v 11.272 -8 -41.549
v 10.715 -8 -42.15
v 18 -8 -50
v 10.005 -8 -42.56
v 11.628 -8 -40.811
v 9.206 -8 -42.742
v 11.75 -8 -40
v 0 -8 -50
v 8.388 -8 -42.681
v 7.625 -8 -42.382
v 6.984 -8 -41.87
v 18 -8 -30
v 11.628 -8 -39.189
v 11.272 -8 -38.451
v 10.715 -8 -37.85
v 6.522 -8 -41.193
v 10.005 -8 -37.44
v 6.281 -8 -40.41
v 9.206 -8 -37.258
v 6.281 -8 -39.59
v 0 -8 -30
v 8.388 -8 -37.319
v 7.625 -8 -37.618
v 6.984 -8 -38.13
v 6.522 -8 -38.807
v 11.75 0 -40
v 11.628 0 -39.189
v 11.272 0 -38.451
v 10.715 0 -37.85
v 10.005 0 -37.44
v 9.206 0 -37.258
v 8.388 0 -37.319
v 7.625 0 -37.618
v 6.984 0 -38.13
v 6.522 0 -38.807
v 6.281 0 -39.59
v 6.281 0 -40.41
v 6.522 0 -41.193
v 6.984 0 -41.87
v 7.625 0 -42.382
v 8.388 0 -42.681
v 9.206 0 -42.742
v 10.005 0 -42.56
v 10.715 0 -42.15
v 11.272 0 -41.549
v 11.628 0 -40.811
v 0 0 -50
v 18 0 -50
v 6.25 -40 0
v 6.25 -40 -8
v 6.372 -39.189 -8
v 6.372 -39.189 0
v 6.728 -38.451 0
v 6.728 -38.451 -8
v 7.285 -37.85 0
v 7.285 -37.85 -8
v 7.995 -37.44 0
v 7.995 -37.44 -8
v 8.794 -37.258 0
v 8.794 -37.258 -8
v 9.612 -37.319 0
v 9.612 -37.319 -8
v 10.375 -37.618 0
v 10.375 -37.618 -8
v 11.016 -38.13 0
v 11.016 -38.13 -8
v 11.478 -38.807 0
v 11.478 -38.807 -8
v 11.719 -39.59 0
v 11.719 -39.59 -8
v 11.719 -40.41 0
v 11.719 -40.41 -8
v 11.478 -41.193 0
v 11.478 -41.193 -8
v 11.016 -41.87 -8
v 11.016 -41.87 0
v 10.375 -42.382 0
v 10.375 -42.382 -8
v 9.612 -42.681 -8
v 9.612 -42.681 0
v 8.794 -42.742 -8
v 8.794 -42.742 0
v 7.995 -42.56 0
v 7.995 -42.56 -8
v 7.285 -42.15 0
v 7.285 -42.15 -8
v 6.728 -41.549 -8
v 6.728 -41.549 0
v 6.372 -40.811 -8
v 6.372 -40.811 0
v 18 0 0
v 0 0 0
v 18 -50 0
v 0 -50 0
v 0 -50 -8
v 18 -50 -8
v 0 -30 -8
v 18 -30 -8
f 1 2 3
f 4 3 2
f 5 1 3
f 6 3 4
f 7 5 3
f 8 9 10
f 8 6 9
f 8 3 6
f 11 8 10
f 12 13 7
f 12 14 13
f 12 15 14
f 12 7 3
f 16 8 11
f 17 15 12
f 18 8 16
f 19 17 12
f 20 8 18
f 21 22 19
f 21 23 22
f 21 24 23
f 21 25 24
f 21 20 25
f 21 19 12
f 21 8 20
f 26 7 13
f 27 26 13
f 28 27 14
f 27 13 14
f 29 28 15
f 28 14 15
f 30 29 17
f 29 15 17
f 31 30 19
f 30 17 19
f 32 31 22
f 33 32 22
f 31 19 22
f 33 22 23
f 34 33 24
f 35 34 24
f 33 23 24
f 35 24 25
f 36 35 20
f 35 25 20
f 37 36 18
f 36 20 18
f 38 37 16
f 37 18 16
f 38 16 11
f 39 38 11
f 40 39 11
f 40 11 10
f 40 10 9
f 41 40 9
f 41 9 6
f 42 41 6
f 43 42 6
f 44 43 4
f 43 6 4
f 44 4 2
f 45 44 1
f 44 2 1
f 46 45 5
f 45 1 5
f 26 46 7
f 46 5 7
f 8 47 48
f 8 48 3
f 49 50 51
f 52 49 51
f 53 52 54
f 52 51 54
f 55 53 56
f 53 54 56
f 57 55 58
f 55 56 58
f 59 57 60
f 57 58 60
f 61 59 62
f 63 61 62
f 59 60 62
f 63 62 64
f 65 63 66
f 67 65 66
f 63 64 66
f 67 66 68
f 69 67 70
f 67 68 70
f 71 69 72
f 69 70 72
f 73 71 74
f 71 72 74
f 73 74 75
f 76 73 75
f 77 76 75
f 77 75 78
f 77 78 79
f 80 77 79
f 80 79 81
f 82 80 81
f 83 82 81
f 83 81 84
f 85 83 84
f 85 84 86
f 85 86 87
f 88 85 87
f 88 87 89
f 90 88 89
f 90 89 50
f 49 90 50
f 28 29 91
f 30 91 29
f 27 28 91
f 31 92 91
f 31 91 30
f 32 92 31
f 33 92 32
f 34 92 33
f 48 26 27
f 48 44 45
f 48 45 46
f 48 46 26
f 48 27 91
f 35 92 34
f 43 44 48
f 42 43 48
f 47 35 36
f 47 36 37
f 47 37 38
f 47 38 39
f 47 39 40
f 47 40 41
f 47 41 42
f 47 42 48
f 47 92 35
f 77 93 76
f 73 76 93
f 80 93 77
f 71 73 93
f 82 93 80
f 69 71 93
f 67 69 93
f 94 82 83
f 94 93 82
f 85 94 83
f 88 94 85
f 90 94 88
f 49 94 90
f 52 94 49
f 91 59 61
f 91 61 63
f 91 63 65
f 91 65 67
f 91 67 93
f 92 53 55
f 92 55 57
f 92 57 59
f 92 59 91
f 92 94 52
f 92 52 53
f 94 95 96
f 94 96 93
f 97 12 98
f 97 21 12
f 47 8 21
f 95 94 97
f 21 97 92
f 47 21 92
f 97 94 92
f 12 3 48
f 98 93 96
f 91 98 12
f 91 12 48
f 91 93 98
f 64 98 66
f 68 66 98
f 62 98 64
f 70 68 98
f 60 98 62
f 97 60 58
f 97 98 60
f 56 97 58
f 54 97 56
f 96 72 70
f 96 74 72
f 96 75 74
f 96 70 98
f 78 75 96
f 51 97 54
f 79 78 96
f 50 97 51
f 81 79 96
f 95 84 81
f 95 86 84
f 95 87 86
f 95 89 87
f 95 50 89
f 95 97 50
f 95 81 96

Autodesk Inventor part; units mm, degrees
ref_plane "YZ Plane" through (0, 0, 0) normal (1, 0, 0) x (0, 1, 0)
ref_plane "XZ Plane" through (0, 0, 0) normal (0, 1, 0) x (-1, 0, 0)
ref_plane "XY Plane" through (0, 0, 0) normal (0, 0, 1) x (1, 0, 0)
sketch "Sketch1" plane through (0, 0, 0) normal (1, 0, 0) x (0, 1, 0)
  line L0 (-50, 0) -> (0, 0)
  line L1 (0, 0) -> (0, -50)
  line L2 (0, -50) -> (-8, -50)
  line L3 (-8, -50) -> (-8, -30)
  line L4 (-8, -30) -> (-30, -8)
  line L5 (-30, -8) -> (-50, -8)
  line L6 (-50, -8) -> (-50, 0)
  dimension "d0" = 50
  dimension "d1" = 8
  dimension "d2" = 8
  dimension "d3" = 20
  dimension "d4" = 20
extrude "Extrusion1" add sketch "Sketch1" along normal blind 18
sketch "Sketch2" plane through (0, -8, -50) normal (0, -1, 0) x (1, 0, 0)
  circle A0 centre (9, 10) radius 2.75
  line L0 (18, 20) -> (18, 0) projected
  line L1 (0, 0) -> (18, 0) projected
  point P0 (0, 50)
  dimension "d7" = 5.5
  dimension "d8" = 9
  dimension "d9" = 10
extrude "Extrusion2" cut sketch "Sketch2" against normal through all
sketch "Sketch3" plane through (0, -50, -8) normal (0, 0, -1) x (-1, 0, 0)
  circle A0 centre (-9, 10) radius 2.75
  line L0 (-18, 0) -> (-18, 20) projected
  line L1 (0, 0) -> (-18, 0) projected
  point P0 (0, 50)
  dimension "d12" = 5.5
  dimension "d13" = 9
  dimension "d14" = 10
extrude "Extrusion3" cut sketch "Sketch3" against normal through all
properties part number "90degree Braces" material "Steel, Cast"
